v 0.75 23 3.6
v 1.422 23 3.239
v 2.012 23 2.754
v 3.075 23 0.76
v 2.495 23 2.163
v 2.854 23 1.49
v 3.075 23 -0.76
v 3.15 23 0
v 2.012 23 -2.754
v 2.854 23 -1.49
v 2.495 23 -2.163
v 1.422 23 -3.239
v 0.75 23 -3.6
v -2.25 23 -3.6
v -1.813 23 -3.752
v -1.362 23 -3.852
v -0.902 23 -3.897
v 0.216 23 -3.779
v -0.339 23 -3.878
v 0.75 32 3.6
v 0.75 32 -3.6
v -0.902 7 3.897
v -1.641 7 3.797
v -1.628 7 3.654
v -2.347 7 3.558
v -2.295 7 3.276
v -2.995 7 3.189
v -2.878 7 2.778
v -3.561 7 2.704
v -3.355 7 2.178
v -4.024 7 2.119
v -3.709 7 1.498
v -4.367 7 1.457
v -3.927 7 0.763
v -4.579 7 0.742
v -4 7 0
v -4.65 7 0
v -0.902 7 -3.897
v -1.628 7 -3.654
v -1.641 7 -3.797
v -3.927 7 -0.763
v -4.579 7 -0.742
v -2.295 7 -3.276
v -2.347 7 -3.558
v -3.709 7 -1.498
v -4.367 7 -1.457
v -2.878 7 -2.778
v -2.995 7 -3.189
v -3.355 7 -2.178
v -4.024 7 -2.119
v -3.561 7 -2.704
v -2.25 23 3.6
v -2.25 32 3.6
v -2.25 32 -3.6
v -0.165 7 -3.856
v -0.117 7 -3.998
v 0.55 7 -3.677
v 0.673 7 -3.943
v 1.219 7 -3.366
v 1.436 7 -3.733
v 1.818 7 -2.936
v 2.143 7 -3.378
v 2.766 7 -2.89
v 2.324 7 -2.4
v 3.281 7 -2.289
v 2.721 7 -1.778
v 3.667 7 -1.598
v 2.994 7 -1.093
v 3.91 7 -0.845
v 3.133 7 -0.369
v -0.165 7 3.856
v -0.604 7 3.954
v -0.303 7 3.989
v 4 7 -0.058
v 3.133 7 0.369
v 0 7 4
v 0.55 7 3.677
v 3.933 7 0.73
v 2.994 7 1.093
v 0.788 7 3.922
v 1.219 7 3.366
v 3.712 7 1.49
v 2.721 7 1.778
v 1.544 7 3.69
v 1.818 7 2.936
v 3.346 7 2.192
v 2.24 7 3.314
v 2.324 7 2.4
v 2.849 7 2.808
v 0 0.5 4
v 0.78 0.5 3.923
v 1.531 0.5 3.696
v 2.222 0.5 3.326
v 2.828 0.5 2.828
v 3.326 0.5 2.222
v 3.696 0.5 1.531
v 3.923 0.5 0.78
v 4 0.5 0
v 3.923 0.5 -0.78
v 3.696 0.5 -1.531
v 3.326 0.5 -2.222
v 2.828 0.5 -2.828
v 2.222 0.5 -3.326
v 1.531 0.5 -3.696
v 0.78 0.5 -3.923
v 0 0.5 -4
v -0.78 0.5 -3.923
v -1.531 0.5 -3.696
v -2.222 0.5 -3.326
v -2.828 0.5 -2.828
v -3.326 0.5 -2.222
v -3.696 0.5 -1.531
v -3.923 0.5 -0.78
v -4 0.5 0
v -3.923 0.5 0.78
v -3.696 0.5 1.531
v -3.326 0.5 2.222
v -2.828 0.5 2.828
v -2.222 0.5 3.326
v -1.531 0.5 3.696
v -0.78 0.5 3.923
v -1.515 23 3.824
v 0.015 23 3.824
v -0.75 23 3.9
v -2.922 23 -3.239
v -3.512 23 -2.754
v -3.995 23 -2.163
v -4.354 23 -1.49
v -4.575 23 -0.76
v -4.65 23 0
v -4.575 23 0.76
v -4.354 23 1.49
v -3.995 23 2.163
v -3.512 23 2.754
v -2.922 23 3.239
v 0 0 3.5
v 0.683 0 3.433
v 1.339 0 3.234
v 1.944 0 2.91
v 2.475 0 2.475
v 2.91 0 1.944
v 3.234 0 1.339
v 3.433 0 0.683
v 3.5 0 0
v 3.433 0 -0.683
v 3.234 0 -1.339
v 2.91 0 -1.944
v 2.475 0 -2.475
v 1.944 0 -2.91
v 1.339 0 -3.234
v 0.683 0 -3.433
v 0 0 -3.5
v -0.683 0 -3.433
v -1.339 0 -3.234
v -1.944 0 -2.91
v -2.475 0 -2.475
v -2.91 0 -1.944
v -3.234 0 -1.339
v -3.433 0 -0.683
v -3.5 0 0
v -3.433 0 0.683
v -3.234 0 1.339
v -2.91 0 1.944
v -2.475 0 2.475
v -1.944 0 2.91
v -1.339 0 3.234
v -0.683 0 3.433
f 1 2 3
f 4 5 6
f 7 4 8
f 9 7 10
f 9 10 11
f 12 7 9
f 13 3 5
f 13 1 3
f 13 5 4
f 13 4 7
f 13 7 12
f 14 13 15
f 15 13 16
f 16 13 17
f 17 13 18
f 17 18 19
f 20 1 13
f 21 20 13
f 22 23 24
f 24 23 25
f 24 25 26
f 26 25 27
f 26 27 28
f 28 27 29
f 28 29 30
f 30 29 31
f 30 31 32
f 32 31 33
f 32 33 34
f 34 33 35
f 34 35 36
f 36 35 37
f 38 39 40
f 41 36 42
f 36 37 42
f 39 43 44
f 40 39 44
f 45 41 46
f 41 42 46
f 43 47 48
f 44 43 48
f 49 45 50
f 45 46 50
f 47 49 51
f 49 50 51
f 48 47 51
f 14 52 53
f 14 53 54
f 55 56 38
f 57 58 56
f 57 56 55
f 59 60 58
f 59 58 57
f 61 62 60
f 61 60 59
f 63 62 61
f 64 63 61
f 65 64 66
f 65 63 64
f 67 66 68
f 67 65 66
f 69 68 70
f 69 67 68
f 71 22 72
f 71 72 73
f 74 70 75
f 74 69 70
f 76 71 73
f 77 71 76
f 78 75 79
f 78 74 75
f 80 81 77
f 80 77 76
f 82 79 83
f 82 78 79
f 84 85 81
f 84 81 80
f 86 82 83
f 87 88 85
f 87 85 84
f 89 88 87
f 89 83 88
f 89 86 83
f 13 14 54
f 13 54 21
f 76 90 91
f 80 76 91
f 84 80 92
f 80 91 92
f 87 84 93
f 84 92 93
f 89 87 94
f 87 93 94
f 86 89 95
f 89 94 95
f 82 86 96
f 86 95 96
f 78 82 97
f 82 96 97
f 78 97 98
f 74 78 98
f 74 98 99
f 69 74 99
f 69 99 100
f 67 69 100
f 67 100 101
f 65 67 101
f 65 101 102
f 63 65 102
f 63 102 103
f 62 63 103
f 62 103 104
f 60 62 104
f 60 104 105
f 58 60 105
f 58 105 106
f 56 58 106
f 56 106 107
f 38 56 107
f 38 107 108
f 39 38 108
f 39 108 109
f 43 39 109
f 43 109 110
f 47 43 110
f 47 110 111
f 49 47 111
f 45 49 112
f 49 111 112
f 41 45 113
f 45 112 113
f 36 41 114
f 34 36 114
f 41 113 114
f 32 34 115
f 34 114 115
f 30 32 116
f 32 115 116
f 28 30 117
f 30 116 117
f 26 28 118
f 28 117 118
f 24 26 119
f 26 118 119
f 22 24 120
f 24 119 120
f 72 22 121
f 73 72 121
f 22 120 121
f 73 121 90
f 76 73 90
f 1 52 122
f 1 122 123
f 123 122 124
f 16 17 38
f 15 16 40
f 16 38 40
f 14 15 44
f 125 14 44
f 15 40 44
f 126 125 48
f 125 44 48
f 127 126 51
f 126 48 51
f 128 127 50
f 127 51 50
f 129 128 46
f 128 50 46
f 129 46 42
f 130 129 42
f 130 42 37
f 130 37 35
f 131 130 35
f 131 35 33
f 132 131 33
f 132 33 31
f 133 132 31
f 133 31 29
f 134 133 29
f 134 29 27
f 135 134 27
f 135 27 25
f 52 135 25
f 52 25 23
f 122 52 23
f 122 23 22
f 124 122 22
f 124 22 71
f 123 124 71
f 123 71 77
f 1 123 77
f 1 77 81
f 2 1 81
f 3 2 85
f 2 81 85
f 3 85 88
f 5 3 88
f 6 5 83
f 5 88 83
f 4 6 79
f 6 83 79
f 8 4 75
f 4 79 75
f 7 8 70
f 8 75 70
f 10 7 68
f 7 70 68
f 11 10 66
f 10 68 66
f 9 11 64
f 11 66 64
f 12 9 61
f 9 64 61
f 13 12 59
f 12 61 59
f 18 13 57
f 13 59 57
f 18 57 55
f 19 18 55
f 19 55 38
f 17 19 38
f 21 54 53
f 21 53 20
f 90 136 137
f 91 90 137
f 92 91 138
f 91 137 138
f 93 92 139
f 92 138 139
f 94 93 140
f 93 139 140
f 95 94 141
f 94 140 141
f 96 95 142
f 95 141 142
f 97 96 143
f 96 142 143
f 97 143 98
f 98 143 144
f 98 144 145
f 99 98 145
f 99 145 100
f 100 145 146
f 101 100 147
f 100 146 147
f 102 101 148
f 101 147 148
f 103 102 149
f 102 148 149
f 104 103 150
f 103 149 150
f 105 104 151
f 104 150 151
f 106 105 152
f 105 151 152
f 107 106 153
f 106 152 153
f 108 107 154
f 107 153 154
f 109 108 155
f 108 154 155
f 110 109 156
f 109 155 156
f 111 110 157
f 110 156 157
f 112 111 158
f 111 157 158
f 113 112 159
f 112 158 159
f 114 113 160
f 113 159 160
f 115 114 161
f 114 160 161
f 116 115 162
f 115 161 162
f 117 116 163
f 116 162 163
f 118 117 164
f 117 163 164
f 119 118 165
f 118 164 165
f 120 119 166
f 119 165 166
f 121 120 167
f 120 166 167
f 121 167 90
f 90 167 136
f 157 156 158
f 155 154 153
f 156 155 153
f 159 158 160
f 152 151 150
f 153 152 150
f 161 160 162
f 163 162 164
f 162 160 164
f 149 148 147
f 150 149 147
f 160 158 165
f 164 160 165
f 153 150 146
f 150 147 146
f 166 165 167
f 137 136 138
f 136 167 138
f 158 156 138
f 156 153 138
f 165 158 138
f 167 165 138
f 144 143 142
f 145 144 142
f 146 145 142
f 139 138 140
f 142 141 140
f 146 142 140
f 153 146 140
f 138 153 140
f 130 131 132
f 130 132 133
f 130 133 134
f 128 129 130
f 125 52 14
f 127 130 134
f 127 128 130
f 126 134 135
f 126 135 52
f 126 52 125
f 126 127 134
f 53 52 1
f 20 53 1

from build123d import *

# Parameters (mm, degrees)
SKETCH1_R           = 4
BOSS_EXTRUDE1_DEPTH = 7
SKETCH2_R           = 3.9
BOSS_EXTRUDE2_DEPTH = 16
CHAMFER1_SIZE       = 0.5
SKETCH3_W           = 3
SKETCH3_H           = 7.2
BOSS_EXTRUDE3_DEPTH = 9


with BuildPart() as part:
    # Sketch1 → Boss-Extrude1 (new body)
    with BuildSketch(Plane(origin=(0, 0, 0), x_dir=(1, 0, 0), z_dir=(0, 1, 0))):
        with Locations(Location((0, 0, 0), (0, 0, 270))):
            Circle(SKETCH1_R)
    extrude(amount=BOSS_EXTRUDE1_DEPTH)

    # Sketch2 → Boss-Extrude2 (add)
    with BuildSketch(Plane(origin=(0, 7, 0), x_dir=(1, 0, 0), z_dir=(0, 1, 0))):
        with Locations(Location((-0.75, 0, 0), (0, 0, 92.228731213))):
            Circle(SKETCH2_R)
    extrude(amount=BOSS_EXTRUDE2_DEPTH)

    # Chamfer1
    chamfer1_edges = [part.edges().sort_by_distance(p)[0] for p in [
        (0, 0, -4),
    ]]
    chamfer(chamfer1_edges, length=CHAMFER1_SIZE)

    # Sketch3 → Boss-Extrude3 (add)
    with BuildSketch(Plane(origin=(0, 23, 0), x_dir=(1, 0, 0), z_dir=(0, 1, 0))):
        with Locations((-0.75, 0)):
            Rectangle(SKETCH3_W, SKETCH3_H)
    extrude(amount=BOSS_EXTRUDE3_DEPTH)


solid = part.part
